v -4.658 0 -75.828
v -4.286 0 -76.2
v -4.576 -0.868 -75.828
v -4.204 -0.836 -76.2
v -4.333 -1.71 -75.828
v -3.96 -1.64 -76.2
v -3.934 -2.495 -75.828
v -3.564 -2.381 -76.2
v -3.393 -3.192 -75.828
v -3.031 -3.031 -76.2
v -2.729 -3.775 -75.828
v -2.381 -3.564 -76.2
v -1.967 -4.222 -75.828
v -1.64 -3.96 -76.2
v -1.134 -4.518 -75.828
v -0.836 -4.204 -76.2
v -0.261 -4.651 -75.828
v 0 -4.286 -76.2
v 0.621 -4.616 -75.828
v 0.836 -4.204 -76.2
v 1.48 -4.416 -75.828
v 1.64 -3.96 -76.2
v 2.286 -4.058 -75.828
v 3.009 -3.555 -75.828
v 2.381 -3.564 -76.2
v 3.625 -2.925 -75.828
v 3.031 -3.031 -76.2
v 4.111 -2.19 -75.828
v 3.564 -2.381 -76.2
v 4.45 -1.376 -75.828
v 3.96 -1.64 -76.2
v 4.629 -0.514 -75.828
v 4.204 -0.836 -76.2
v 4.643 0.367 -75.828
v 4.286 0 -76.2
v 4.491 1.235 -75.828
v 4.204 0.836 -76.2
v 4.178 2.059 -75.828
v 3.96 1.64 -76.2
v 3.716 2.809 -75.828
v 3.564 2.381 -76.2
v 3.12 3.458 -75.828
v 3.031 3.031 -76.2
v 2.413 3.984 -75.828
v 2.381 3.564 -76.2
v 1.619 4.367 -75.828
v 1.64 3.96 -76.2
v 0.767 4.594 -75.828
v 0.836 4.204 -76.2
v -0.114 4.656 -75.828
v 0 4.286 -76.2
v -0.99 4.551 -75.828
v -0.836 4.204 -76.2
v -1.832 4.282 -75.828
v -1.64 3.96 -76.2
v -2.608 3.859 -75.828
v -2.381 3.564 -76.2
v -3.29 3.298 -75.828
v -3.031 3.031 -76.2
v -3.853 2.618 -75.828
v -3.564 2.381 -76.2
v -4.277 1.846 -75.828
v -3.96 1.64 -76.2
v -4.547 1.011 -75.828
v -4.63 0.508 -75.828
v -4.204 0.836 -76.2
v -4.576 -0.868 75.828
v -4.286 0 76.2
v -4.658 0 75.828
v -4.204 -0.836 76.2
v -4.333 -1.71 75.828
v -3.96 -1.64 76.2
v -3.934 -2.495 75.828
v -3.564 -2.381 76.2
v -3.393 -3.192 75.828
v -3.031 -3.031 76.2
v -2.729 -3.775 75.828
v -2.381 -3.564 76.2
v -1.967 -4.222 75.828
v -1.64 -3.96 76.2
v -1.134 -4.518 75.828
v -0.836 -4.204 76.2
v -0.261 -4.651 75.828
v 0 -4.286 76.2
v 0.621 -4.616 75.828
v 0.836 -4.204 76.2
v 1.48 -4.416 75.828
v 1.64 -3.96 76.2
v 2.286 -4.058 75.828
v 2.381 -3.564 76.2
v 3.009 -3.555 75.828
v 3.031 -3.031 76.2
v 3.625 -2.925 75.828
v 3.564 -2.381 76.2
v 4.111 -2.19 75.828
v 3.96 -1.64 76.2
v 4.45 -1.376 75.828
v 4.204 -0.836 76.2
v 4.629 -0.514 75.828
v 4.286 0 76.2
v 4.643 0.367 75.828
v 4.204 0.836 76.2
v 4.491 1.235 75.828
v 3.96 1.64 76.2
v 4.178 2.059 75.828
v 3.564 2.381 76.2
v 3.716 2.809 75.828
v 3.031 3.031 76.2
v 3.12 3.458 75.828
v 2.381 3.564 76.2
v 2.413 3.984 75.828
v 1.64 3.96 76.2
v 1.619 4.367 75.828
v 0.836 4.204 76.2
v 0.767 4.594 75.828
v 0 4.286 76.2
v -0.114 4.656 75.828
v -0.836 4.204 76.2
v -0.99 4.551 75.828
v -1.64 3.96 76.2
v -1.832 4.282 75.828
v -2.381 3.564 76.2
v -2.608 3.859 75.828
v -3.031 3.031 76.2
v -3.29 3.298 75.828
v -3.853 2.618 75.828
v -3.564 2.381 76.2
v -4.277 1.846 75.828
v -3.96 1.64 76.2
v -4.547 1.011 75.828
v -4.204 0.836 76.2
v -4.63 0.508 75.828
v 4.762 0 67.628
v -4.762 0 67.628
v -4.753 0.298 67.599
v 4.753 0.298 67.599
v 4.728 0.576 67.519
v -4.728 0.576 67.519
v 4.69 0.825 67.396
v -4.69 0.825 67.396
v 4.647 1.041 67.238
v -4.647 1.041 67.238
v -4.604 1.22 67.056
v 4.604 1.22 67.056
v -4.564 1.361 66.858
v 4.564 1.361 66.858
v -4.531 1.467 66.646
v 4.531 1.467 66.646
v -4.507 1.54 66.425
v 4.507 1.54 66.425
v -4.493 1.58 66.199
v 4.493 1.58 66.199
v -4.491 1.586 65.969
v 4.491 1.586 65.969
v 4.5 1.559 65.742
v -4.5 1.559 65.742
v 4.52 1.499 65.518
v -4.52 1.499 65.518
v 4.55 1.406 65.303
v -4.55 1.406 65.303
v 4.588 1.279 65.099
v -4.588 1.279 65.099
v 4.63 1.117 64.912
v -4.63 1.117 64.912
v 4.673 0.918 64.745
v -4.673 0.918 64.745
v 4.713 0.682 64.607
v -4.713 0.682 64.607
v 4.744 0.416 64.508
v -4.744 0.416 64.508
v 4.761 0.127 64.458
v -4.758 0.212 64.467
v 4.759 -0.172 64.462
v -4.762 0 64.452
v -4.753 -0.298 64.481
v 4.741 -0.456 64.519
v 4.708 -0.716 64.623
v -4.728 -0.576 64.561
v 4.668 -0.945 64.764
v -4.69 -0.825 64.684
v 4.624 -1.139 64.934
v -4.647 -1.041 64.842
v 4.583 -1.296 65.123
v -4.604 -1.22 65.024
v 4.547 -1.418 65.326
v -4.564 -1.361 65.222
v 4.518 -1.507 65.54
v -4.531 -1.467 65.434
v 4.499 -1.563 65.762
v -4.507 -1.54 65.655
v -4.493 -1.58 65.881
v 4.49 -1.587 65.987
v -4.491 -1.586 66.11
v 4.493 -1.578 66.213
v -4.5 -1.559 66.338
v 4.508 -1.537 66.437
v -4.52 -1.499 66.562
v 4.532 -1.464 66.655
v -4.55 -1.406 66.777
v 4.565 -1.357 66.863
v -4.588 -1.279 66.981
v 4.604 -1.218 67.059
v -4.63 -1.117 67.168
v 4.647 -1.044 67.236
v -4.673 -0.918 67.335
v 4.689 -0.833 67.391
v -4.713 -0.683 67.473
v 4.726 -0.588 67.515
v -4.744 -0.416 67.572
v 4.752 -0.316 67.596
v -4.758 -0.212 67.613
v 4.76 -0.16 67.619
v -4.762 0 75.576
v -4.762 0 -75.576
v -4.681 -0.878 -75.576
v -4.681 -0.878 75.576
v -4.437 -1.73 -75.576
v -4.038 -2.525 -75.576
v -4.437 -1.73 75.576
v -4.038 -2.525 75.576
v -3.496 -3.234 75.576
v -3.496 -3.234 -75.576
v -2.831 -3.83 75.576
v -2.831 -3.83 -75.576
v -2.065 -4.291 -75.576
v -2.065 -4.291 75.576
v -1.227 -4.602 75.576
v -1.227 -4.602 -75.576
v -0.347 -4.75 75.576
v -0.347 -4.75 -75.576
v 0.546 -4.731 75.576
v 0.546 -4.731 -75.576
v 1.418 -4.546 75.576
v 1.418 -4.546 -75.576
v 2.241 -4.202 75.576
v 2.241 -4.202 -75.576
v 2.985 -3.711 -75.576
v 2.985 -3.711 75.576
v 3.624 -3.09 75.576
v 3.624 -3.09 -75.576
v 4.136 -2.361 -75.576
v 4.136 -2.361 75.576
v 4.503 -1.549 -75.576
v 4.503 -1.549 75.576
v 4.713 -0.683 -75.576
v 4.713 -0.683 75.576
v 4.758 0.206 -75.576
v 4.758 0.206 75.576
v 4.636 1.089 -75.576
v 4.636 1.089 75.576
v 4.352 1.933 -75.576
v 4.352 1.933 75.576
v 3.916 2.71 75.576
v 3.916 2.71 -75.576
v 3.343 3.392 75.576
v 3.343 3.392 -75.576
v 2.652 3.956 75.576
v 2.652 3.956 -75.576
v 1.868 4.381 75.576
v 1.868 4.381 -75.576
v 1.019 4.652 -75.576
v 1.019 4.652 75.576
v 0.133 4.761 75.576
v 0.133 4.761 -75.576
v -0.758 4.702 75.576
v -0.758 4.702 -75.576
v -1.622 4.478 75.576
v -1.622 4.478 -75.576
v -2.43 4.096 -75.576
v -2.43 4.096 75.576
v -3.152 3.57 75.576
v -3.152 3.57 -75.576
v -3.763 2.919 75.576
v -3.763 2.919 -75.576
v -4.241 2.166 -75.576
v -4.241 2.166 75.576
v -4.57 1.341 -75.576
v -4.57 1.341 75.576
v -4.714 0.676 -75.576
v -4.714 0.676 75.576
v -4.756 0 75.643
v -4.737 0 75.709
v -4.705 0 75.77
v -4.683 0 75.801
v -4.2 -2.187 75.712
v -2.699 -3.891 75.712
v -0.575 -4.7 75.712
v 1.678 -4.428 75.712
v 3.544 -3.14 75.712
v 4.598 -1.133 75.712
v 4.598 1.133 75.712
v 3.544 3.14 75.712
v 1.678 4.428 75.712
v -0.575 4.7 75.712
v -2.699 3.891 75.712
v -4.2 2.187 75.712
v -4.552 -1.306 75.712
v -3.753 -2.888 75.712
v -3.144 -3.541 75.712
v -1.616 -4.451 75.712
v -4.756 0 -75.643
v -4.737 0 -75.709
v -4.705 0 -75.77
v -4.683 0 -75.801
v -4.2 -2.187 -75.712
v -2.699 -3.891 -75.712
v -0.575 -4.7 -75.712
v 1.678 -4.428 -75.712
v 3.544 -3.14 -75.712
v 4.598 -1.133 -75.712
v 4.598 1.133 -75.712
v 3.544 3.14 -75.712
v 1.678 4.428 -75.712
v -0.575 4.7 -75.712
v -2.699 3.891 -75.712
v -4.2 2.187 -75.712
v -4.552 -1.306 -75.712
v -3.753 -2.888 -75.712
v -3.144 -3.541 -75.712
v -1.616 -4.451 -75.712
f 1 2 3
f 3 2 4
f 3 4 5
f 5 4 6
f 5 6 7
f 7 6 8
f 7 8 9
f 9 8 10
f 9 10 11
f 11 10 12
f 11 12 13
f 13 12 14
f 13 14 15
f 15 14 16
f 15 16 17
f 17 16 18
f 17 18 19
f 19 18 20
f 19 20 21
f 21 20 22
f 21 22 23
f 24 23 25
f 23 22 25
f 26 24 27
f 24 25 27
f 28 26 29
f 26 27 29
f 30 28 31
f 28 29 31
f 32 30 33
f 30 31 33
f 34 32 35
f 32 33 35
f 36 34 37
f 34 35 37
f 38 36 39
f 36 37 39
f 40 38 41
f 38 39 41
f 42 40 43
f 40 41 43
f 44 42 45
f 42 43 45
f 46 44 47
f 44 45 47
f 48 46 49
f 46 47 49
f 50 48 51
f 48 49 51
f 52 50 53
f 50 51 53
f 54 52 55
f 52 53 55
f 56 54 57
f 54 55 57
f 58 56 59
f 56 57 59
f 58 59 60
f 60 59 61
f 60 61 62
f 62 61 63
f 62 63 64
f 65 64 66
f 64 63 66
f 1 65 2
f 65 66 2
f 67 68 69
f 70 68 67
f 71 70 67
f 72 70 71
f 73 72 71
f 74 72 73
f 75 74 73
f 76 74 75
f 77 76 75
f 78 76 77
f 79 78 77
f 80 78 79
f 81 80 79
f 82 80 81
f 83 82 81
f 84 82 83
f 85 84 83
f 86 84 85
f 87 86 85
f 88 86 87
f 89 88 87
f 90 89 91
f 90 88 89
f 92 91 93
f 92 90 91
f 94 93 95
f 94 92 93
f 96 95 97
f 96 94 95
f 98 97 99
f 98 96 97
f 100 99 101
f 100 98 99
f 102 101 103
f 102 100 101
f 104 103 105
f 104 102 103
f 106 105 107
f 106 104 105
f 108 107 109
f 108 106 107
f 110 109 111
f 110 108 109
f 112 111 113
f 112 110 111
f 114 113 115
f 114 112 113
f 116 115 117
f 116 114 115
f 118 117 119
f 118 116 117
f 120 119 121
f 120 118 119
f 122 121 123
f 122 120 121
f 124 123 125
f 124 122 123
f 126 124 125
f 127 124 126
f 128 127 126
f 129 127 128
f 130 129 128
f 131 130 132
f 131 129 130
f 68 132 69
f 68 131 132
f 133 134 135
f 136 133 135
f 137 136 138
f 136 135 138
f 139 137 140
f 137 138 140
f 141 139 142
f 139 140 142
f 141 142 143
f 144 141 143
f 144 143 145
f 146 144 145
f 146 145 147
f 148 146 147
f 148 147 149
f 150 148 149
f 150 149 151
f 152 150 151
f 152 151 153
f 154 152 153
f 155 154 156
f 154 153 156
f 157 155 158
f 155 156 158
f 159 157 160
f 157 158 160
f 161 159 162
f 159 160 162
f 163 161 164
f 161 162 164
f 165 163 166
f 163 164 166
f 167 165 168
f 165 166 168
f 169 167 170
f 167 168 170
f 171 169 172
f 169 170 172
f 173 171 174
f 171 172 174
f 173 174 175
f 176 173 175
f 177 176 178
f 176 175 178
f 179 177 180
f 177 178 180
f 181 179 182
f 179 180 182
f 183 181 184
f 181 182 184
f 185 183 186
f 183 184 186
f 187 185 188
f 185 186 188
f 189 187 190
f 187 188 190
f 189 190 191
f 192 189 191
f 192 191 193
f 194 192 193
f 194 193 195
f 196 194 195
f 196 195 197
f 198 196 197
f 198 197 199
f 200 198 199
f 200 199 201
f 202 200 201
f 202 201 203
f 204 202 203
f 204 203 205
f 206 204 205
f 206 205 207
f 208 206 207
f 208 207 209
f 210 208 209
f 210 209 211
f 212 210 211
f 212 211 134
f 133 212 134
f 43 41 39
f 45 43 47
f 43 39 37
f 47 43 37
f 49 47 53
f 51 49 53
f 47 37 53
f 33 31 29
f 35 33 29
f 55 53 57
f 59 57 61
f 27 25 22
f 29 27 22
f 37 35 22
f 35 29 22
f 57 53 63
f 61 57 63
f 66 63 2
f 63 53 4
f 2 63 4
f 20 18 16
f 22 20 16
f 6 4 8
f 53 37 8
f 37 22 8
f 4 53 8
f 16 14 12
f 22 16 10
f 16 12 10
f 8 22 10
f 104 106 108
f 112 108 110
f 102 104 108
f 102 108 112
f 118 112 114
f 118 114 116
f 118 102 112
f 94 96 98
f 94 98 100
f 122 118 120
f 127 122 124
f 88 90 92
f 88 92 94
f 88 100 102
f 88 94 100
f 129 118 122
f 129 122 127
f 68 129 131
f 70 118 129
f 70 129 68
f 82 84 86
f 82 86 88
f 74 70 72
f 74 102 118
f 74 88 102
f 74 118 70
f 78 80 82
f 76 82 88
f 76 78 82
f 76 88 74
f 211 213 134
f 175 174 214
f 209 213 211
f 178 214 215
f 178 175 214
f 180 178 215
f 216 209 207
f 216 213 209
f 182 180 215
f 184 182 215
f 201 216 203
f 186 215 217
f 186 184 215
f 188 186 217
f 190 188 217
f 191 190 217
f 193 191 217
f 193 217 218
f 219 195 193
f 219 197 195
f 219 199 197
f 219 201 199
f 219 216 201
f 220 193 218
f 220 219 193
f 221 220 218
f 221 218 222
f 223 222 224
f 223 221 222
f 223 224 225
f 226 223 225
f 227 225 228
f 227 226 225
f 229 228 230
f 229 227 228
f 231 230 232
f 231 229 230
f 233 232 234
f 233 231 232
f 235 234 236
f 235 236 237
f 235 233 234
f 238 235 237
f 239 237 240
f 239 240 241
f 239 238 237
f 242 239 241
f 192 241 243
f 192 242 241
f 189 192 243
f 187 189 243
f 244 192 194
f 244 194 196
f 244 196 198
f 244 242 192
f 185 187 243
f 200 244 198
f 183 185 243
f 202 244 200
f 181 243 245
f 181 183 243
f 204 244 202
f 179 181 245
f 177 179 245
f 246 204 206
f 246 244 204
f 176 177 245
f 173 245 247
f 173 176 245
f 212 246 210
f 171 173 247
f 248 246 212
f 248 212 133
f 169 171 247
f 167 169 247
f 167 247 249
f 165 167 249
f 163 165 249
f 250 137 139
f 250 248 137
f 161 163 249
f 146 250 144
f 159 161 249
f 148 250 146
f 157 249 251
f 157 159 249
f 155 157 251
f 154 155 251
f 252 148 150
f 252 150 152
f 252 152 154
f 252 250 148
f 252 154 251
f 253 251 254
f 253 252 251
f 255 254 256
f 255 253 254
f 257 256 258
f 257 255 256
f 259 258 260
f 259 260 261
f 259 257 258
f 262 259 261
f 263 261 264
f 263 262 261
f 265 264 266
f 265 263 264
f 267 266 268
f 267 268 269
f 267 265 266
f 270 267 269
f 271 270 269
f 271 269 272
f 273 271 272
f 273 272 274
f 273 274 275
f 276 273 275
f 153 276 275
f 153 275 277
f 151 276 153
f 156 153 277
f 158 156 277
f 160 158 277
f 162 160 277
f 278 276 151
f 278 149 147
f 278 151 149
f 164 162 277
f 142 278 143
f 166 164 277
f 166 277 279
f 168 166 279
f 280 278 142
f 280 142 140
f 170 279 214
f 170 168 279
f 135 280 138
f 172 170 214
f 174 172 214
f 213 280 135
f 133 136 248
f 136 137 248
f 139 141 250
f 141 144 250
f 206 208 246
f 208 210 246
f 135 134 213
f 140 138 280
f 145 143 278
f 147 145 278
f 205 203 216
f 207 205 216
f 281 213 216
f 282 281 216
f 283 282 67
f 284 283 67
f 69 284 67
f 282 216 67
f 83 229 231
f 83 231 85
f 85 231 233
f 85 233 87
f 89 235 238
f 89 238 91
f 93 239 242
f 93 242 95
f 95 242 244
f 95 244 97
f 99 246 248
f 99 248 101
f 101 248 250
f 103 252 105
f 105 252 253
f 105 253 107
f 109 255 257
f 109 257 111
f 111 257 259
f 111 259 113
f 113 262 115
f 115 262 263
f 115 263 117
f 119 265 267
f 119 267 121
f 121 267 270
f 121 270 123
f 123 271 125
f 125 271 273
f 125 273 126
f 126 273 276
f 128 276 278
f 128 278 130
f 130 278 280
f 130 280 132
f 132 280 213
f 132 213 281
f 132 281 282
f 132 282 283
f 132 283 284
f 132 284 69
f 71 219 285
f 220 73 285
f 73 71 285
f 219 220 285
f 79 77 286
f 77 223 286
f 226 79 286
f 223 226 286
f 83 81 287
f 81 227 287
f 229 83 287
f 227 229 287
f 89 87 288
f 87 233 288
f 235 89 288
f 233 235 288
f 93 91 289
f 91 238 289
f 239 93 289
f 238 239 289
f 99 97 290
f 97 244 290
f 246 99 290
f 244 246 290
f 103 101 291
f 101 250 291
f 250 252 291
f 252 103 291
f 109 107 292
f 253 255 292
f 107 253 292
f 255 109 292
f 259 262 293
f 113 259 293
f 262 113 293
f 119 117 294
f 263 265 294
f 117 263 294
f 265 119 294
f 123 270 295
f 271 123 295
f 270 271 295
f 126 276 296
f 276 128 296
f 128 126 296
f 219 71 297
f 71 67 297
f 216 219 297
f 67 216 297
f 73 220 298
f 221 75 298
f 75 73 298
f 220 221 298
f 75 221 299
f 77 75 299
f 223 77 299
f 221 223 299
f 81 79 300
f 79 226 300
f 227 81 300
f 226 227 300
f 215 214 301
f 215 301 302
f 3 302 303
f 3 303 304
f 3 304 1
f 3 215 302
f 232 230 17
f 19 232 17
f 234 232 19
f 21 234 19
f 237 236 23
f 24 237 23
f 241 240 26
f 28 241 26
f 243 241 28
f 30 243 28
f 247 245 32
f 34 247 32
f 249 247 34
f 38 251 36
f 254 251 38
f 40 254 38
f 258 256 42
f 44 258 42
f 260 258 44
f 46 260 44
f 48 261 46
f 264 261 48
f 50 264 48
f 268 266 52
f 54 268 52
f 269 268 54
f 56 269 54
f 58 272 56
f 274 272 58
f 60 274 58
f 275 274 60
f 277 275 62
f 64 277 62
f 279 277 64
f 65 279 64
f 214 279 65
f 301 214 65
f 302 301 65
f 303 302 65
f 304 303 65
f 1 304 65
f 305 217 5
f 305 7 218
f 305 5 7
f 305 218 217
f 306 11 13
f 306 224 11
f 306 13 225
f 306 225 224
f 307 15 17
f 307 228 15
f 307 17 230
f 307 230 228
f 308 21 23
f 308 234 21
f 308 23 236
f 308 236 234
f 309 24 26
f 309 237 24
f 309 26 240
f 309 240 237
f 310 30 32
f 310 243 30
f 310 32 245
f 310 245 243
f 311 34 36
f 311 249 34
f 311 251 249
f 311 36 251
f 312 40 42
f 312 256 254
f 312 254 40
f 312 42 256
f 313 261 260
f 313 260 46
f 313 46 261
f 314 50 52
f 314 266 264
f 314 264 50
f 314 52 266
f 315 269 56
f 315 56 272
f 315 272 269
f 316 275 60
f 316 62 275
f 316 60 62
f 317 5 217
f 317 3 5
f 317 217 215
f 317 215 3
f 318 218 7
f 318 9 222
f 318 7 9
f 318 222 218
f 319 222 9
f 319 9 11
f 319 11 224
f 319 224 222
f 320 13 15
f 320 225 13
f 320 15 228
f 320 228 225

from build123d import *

# Parameters (mm, degrees)
SKETCH3_R           = 4.7625
BOSS_EXTRUDE1_DEPTH = 76.2
CHAMFER1_SIZE       = 0.47625
FILLET2_R           = 0.3571875
SKETCH4_R           = 1.5875
CUT_EXTRUDE1_DEPTH  = 362.708529549


with BuildPart() as part:
    # Sketch3 → Boss-Extrude1 (new, symmetric)
    with BuildSketch(Plane.XY):
        with Locations(Location((0, 0, 0), (0, 0, 180))):
            Circle(SKETCH3_R)
    extrude(amount=BOSS_EXTRUDE1_DEPTH, both=True)

    # Chamfer1
    chamfer1_edges = [part.edges().sort_by_distance(p)[0] for p in [
        (4.7625, 0, -76.2),
        (4.7625, 0, 76.2),
    ]]
    chamfer(chamfer1_edges, length=CHAMFER1_SIZE)

    # Fillet2
    fillet2_edges = [part.edges().sort_by_distance(p)[0] for p in [
        (4.7625, 0, -75.72375),
        (4.7625, 0, 75.72375),
    ]]
    fillet(fillet2_edges, radius=FILLET2_R)

    # Sketch4 → Cut-Extrude1 (cut, through all)
    with BuildSketch(Plane(origin=(-4.7625, -167.656009053, -241.627303232), x_dir=(0, 0, 1), z_dir=(-1, 0, 0))):
        with Locations((307.667303232, 167.656009053)):
            Circle(SKETCH4_R)
    extrude(amount=-CUT_EXTRUDE1_DEPTH, mode=Mode.SUBTRACT)


solid = part.part
